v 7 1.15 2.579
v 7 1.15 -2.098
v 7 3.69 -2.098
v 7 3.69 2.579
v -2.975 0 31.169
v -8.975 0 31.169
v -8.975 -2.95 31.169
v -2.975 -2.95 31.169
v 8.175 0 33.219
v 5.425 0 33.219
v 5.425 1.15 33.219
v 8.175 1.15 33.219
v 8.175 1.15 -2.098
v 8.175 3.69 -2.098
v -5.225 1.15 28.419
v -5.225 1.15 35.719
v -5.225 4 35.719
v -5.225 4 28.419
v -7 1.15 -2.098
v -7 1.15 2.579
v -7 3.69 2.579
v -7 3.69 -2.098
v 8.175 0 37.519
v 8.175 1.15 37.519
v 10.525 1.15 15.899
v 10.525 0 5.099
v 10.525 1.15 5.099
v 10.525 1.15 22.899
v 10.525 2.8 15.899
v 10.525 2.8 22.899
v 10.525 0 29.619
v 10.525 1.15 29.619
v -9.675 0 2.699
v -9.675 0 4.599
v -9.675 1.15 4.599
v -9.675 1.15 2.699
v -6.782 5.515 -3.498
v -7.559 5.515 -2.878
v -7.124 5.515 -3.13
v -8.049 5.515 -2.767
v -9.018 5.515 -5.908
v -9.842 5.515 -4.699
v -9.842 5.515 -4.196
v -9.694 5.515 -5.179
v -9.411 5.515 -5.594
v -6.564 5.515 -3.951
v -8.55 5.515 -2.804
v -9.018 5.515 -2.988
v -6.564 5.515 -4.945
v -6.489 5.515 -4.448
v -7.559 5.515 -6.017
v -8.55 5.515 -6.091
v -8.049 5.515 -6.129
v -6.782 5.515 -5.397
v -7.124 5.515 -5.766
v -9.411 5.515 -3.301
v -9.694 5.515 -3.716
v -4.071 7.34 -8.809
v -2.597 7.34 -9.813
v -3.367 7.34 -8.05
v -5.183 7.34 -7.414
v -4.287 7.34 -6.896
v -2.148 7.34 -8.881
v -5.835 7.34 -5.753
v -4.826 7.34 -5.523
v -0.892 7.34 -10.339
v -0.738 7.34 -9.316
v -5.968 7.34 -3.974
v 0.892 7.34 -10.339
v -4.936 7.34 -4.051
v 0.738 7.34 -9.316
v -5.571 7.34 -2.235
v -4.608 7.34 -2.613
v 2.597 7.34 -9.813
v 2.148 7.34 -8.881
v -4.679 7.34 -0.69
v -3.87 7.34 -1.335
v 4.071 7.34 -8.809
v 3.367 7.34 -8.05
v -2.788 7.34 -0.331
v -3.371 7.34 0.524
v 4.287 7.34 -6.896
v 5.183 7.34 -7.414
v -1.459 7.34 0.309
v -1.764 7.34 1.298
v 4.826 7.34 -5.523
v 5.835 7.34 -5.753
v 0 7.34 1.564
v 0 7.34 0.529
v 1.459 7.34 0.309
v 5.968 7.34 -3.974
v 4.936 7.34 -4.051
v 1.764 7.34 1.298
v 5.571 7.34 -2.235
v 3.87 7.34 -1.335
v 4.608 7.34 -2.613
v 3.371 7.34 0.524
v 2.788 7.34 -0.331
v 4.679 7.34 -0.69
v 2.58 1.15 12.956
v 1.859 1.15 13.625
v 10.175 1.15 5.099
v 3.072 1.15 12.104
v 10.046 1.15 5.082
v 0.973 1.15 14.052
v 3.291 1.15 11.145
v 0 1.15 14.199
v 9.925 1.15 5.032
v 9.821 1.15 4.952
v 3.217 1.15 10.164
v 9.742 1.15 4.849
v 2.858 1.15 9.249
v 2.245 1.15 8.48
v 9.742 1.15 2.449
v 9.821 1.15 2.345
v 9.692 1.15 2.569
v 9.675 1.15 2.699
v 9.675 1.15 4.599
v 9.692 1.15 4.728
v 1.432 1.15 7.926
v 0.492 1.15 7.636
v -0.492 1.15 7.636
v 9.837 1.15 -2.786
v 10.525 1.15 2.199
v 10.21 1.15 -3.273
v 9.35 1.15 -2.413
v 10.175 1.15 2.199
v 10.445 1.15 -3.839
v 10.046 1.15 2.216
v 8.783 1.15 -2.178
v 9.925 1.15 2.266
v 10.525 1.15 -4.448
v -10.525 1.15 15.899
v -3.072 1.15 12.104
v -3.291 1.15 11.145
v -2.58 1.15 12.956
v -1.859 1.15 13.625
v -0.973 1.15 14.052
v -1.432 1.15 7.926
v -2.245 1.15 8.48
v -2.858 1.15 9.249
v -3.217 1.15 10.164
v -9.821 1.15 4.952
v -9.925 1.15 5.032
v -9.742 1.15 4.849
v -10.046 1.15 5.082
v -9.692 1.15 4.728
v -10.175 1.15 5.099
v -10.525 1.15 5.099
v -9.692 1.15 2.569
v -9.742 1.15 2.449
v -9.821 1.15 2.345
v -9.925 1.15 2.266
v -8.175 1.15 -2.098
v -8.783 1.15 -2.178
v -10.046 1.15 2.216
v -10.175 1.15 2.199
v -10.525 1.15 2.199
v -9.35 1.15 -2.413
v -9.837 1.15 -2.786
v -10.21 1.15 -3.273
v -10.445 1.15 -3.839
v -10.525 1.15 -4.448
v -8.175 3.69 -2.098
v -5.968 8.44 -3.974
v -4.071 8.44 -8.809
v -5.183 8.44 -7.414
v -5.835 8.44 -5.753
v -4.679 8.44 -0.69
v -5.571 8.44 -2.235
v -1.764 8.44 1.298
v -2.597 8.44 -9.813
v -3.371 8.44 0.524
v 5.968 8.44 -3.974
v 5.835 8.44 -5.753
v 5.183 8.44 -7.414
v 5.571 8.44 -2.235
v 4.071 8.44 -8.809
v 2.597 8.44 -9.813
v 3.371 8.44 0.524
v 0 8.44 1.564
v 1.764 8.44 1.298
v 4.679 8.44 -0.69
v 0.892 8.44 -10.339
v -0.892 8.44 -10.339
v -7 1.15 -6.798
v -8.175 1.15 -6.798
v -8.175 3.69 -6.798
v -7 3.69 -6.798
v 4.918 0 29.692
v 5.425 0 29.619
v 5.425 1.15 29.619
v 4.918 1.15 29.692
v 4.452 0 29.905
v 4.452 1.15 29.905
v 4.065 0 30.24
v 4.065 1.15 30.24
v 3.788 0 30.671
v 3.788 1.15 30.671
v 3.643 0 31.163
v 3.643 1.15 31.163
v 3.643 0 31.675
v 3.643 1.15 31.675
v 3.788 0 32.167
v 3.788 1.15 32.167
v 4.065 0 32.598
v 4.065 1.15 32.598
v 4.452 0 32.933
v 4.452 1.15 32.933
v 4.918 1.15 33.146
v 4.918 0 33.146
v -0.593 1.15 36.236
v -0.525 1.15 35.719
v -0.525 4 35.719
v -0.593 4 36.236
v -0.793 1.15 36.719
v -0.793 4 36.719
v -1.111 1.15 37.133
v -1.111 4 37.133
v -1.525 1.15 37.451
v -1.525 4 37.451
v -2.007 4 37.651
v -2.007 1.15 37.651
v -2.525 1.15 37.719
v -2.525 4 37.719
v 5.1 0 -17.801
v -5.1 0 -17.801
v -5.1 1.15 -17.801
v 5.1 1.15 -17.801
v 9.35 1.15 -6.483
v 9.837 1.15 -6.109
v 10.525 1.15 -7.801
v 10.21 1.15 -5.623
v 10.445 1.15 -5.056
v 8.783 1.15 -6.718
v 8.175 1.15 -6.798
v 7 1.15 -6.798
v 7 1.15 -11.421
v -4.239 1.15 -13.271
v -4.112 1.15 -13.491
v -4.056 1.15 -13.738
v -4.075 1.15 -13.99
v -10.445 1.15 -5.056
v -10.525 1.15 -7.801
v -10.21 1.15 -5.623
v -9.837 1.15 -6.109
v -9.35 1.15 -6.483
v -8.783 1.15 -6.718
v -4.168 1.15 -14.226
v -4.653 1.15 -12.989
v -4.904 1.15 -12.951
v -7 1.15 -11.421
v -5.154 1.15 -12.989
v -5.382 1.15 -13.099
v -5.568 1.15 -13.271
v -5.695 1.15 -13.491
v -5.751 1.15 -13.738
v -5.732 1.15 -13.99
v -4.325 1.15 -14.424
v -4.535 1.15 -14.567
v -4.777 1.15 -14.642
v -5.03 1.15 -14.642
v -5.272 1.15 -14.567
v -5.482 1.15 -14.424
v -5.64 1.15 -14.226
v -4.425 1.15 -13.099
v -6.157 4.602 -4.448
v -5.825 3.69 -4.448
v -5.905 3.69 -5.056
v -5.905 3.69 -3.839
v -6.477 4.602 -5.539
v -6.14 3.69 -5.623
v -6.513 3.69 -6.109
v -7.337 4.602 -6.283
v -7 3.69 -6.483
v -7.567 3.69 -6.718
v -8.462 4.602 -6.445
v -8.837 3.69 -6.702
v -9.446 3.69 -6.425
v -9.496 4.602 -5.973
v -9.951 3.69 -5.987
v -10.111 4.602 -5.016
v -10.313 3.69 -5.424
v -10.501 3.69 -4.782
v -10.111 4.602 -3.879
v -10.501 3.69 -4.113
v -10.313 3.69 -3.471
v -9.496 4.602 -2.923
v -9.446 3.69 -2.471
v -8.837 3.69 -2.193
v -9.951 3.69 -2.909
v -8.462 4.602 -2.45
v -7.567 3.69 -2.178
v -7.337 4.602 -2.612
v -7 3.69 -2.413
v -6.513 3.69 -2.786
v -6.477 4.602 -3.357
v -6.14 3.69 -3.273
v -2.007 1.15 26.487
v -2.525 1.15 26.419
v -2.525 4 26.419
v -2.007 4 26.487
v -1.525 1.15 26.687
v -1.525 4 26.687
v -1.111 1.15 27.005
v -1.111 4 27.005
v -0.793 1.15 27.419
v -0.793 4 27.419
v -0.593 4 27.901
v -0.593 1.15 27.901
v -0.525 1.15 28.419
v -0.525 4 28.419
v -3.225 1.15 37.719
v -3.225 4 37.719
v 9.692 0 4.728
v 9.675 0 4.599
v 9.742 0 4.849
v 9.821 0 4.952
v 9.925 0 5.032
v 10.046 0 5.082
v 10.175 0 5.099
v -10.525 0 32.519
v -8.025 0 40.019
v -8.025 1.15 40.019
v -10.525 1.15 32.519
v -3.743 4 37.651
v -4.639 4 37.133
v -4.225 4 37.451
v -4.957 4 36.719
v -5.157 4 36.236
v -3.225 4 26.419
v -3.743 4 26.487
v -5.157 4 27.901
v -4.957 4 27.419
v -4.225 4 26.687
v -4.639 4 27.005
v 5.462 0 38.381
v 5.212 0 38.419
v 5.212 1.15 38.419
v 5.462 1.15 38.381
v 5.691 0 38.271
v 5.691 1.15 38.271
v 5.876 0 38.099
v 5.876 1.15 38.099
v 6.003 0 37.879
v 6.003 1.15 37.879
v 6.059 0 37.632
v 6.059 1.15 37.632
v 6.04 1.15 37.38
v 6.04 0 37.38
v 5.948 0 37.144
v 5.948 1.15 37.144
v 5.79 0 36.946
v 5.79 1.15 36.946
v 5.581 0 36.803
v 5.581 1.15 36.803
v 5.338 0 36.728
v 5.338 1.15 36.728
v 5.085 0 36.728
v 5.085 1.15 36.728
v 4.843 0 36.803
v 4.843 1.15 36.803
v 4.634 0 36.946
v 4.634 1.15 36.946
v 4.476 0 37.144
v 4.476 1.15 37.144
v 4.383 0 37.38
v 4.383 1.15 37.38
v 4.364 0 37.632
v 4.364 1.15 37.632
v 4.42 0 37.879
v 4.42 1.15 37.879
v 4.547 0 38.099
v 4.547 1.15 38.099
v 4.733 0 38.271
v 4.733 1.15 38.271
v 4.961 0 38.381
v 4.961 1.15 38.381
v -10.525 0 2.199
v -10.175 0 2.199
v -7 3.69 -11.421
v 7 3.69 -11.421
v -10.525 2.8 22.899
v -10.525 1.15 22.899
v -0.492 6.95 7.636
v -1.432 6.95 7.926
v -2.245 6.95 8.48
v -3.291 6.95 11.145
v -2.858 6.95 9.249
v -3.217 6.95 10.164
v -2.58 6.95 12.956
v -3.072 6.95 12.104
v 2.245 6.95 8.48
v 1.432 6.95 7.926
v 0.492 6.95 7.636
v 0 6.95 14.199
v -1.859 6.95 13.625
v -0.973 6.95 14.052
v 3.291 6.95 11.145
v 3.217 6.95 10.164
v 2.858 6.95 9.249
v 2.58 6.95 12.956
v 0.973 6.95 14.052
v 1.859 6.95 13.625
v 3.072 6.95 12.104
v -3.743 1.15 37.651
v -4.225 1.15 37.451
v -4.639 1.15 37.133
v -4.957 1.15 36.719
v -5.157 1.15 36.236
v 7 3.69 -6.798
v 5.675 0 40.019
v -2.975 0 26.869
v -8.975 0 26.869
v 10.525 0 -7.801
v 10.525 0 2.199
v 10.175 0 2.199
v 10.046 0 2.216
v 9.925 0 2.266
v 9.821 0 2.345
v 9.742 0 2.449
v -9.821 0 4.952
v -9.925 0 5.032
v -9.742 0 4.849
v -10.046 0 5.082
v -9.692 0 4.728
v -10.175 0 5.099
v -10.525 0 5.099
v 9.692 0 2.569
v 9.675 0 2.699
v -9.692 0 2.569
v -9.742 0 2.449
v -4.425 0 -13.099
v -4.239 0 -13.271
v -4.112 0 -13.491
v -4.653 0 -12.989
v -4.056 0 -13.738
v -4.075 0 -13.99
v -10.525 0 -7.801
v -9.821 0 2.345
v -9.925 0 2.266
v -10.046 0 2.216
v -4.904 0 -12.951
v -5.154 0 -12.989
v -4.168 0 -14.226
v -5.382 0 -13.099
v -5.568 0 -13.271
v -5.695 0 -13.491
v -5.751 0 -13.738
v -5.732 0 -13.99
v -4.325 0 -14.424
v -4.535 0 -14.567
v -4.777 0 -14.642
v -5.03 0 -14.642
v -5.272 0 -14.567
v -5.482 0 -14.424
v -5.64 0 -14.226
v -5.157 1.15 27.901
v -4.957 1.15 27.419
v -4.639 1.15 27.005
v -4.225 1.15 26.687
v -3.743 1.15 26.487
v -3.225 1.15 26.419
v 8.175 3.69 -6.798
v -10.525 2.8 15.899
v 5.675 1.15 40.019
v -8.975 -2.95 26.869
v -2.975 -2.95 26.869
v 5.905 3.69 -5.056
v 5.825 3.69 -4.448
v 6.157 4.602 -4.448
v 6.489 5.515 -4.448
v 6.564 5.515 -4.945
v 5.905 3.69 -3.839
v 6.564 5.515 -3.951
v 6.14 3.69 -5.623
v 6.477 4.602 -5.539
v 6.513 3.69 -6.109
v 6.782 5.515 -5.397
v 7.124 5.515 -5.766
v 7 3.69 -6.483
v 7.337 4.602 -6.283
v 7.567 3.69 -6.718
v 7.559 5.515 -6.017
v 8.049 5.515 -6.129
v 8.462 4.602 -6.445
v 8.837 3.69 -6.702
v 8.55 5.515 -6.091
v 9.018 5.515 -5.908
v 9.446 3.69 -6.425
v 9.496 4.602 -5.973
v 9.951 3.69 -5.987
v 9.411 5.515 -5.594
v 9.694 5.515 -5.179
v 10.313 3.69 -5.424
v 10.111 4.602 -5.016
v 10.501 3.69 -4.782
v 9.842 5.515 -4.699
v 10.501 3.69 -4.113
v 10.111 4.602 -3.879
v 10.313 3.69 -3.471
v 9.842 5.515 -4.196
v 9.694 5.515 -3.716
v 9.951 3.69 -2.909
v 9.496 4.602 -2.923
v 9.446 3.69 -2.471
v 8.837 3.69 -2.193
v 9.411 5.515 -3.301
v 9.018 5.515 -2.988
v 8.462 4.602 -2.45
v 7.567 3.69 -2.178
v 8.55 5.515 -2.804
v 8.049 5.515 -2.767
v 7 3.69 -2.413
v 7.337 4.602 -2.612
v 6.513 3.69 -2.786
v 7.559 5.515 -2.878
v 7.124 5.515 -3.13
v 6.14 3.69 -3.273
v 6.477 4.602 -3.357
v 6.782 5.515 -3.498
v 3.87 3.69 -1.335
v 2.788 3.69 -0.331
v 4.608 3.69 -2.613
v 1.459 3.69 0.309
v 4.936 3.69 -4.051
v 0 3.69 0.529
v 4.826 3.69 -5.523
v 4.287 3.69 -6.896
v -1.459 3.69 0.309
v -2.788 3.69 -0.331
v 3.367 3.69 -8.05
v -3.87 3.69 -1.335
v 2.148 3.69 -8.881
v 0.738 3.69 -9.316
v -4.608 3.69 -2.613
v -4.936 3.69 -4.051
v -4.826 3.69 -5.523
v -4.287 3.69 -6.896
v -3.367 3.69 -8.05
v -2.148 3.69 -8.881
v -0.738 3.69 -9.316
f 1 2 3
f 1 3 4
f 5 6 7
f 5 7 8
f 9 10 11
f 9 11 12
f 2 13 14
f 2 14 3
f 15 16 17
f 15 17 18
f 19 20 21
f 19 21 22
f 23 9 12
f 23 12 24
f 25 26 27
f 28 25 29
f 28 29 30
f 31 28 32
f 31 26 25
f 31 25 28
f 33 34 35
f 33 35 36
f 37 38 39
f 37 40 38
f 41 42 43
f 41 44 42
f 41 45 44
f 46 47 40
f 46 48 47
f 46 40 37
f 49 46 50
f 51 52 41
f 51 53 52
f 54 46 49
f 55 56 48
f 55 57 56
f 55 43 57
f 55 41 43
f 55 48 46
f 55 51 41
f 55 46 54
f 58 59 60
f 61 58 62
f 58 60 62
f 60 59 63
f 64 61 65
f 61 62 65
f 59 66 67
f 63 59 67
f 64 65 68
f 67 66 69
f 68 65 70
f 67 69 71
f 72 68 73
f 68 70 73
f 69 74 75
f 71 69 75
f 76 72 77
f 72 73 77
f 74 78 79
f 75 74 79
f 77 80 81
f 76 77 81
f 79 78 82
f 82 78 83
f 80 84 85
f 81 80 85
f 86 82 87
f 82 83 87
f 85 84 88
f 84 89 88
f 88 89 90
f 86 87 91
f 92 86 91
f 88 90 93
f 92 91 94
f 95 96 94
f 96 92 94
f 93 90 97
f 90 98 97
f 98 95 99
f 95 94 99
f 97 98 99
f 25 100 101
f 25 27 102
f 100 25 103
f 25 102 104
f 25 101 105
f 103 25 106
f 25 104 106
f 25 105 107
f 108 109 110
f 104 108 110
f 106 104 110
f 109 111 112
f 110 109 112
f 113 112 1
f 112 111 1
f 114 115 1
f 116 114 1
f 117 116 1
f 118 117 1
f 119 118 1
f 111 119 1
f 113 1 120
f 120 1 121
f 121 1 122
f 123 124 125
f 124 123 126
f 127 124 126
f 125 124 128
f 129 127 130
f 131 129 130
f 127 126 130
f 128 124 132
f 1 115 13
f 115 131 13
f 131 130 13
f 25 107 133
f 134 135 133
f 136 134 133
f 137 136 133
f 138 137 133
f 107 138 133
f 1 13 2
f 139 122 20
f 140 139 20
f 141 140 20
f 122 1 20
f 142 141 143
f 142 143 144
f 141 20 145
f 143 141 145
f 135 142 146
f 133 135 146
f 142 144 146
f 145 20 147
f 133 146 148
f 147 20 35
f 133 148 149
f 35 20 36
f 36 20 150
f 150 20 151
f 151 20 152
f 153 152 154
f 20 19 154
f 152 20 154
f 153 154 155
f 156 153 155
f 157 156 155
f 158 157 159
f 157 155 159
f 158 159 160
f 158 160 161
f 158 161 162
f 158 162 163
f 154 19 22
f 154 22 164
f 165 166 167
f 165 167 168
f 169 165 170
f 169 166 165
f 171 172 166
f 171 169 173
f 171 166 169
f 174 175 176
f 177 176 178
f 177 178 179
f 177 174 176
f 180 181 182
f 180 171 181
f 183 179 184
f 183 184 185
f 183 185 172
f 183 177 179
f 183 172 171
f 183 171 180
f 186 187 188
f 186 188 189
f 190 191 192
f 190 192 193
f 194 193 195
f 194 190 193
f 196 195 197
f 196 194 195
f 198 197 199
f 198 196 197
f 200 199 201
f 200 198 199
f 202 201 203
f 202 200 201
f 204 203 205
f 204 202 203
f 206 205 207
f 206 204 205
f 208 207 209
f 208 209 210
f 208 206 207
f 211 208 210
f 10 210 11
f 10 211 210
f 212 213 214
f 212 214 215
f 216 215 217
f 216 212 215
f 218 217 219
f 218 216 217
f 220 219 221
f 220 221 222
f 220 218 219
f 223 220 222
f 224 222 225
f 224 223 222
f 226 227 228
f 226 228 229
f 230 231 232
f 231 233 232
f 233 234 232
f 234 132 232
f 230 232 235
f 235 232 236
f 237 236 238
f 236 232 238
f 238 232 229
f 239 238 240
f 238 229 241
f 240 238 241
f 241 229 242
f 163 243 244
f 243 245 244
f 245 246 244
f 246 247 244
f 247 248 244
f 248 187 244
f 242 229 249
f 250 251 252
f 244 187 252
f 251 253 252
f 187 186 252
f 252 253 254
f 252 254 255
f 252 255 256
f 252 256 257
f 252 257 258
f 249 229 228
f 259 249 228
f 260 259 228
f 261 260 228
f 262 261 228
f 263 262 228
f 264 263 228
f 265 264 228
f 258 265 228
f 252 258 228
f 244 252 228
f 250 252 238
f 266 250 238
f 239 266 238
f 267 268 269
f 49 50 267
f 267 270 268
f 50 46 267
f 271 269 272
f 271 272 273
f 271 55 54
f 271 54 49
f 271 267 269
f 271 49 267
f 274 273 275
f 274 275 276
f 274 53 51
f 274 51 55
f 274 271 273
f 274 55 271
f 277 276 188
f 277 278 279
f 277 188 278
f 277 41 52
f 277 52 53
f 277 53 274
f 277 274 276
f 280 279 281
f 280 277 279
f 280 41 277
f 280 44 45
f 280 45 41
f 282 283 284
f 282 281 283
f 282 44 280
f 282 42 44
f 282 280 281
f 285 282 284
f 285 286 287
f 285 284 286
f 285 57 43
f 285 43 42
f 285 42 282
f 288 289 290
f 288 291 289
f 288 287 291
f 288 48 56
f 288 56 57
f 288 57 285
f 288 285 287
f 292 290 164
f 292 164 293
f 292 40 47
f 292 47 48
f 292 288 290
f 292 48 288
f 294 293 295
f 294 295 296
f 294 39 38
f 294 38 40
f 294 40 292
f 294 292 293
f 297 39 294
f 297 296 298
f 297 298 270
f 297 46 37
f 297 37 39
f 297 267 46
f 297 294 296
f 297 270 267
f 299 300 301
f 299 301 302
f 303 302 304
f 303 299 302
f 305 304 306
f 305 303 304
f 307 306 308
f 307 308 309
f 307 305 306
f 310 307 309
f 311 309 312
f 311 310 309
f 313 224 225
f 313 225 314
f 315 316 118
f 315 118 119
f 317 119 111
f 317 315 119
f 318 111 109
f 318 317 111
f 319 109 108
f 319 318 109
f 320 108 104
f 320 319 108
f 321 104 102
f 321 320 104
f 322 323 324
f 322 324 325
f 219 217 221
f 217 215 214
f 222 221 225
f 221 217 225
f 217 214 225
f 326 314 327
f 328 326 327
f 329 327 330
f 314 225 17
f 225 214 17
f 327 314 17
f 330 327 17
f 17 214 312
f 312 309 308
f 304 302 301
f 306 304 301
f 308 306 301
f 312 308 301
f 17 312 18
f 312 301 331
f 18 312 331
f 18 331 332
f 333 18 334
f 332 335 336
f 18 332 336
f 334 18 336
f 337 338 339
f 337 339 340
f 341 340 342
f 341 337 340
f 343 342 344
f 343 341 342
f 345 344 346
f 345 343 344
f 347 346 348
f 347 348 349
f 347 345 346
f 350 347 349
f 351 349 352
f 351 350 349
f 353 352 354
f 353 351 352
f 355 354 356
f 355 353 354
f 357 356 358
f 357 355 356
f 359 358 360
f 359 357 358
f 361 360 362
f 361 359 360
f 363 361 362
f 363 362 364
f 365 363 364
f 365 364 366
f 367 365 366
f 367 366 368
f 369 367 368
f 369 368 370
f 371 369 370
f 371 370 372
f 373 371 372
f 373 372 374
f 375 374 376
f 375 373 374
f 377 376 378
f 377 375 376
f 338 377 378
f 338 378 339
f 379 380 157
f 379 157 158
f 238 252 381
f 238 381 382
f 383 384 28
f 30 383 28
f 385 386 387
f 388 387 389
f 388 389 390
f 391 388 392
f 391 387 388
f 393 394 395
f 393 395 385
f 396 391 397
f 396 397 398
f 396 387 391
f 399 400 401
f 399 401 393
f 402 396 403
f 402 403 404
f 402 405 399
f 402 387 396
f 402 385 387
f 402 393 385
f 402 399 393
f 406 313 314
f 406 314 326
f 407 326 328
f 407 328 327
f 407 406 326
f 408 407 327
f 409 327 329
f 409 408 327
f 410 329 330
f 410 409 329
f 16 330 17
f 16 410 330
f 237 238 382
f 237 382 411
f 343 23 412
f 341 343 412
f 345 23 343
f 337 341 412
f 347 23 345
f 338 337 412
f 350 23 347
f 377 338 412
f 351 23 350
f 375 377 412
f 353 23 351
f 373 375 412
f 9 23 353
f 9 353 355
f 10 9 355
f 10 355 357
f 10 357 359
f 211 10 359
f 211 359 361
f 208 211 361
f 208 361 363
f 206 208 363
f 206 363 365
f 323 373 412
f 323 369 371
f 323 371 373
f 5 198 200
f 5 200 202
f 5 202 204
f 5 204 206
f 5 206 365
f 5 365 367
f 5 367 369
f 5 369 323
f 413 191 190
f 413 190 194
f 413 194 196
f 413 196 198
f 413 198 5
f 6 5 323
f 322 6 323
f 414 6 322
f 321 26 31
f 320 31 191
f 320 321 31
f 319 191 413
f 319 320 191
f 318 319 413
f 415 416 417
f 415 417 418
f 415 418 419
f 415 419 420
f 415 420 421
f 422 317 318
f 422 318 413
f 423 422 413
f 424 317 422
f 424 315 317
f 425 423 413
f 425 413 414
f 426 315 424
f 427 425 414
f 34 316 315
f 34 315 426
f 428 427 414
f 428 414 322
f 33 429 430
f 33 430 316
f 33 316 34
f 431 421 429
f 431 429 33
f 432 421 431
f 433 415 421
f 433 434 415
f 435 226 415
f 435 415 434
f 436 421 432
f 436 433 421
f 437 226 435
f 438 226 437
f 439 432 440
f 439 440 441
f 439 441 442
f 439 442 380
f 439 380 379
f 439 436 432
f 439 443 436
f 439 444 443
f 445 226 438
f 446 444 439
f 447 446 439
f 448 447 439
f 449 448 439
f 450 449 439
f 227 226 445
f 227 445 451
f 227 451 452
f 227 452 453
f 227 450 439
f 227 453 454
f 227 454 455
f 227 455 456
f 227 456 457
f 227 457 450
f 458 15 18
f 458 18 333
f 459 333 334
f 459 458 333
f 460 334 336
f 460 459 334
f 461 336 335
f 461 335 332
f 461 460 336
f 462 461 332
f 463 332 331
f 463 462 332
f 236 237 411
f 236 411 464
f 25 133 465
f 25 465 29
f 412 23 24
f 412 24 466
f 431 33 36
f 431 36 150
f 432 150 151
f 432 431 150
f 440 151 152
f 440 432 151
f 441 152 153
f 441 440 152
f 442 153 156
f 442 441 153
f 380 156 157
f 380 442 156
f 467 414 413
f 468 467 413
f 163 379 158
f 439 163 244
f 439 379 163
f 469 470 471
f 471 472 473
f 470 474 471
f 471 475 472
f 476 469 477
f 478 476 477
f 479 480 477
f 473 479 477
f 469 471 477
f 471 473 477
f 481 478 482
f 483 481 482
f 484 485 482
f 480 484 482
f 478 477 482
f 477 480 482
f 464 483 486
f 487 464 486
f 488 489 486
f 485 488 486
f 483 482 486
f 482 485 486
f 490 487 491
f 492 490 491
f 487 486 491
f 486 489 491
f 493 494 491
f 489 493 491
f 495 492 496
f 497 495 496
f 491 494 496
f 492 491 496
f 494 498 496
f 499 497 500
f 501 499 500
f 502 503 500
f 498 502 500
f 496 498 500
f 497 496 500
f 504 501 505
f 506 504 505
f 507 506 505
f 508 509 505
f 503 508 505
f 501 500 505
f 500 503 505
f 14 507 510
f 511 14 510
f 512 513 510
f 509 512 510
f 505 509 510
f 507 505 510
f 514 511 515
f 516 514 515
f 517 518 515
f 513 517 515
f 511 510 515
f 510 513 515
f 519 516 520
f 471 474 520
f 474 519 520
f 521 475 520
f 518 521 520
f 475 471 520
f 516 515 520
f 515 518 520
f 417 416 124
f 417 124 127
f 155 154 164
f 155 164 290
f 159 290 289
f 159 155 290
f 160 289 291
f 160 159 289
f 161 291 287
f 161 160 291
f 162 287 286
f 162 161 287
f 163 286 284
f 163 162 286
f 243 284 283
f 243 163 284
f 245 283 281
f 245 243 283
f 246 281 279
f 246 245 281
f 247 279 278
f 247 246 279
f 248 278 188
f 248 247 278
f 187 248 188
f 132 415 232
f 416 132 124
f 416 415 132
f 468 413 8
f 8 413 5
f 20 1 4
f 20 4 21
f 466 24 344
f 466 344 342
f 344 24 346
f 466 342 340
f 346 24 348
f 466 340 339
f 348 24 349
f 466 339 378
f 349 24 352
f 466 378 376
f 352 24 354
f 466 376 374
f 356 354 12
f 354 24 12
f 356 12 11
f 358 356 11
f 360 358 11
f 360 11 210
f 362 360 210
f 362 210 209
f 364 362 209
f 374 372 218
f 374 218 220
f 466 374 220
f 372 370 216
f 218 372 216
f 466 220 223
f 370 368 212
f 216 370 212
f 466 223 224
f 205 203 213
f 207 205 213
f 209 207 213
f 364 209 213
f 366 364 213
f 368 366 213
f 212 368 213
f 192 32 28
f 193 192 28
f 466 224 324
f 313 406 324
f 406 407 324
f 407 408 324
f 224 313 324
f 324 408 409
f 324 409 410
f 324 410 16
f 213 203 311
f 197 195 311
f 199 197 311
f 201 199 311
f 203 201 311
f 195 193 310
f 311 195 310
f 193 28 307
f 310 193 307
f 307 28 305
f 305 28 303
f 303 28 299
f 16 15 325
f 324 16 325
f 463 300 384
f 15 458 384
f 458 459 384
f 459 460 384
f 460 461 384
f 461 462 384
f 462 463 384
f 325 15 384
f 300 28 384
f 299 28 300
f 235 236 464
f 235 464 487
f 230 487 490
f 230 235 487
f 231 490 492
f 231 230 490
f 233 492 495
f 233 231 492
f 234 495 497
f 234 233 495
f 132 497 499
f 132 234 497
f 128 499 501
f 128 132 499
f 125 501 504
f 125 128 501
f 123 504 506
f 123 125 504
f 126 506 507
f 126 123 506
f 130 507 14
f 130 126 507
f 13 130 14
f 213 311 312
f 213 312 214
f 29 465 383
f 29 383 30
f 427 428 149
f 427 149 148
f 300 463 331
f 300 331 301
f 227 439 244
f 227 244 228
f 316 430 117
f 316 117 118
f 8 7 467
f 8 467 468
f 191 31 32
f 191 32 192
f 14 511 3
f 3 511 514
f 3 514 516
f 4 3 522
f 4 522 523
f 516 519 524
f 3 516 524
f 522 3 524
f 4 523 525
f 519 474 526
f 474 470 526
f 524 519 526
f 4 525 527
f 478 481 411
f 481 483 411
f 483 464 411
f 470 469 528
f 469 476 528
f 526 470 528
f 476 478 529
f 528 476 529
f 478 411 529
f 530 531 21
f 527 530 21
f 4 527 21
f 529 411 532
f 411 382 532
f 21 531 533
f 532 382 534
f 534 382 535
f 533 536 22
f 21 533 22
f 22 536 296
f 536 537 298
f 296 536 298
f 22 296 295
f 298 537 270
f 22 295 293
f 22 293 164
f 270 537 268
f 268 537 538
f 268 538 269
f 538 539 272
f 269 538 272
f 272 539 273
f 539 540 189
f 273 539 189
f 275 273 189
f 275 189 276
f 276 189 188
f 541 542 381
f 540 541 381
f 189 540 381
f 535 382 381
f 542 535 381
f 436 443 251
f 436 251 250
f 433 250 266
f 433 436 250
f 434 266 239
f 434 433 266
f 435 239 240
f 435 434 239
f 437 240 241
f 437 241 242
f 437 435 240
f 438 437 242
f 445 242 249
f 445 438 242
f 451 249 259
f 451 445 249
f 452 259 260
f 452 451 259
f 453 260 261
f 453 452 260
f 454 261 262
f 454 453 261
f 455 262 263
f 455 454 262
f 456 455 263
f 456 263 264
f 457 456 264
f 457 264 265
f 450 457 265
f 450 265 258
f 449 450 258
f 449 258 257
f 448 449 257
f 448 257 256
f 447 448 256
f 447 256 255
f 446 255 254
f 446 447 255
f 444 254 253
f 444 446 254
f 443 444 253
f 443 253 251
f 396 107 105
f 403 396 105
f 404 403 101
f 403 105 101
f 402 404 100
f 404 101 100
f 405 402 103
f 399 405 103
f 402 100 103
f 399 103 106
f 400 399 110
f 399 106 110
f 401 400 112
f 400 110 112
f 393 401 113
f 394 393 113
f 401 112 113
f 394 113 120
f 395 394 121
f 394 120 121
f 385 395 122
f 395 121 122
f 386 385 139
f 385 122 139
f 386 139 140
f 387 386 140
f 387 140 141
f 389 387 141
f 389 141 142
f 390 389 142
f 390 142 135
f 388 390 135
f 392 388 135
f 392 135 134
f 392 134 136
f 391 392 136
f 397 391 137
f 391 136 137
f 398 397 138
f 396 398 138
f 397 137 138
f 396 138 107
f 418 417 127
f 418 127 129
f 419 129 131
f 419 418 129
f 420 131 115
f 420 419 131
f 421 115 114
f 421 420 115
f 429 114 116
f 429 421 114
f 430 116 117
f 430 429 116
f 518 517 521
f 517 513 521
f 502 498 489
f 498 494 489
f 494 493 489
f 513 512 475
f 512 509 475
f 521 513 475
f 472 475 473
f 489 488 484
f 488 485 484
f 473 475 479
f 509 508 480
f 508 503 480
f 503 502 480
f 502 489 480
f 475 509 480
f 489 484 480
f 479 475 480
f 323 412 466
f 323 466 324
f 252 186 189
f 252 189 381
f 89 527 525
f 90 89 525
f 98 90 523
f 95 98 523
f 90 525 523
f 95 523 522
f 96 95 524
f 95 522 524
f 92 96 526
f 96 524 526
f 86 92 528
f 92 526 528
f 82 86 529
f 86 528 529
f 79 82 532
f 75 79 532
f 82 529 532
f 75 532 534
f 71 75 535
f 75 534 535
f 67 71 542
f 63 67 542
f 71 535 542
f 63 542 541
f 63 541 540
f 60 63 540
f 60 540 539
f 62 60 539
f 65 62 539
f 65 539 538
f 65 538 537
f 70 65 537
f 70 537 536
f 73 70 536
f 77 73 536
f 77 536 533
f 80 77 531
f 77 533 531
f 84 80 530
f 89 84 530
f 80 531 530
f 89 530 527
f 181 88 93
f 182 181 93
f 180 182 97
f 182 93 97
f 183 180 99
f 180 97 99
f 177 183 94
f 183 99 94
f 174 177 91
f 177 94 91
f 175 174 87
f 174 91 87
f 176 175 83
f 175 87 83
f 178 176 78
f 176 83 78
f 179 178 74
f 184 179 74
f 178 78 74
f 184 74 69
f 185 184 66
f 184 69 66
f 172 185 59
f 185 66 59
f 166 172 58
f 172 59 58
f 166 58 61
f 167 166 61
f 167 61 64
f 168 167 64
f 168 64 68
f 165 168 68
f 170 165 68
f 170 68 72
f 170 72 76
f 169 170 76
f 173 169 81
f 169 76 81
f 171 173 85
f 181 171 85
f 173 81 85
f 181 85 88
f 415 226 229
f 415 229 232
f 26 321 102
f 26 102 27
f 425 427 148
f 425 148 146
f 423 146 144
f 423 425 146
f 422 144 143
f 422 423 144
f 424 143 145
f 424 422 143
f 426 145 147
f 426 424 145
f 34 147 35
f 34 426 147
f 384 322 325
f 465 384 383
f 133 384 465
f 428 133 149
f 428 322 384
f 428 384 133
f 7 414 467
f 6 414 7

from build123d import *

# Parameters (mm, degrees)
SKETCH_1_R      = 0.85
EXTRUDE_1_DEPTH = 1.15
EXTRUDE_2_DEPTH = 2.54
SKETCH_3_R      = 4.95
EXTRUDE_3_DEPTH = 3.65
SKETCH_4_R      = 5.985
EXTRUDE_4_DEPTH = 1.1
SKETCH_5_R      = 2.35
EXTRUDE_5_DEPTH = 1.825
EXTRUDE_5_TAPER = 20
SKETCH_6_R      = 3.3
EXTRUDE_6_DEPTH = 5.8
SKETCH_7_W      = 21.05
SKETCH_7_H      = 7
EXTRUDE_7_DEPTH = 1.65
EXTRUDE_8_DEPTH = 2.85
SKETCH_9_W      = 6
SKETCH_9_H      = 4.3
EXTRUDE_9_DEPTH = 2.95


with BuildPart() as part:
    # Эскиз1 → Бобышка-Вытянуть1 (new body)
    with BuildSketch(Plane(origin=(0, 0, 0), x_dir=(1, 0, 0), z_dir=(0, 1, 0))):
        with BuildLine():
            Line((5.1, 17.801195131), (10.525, 7.801195131))
            Line((10.525, 7.801195131), (10.525, -2.198804869))
            Line((10.525, -2.198804869), (10.175, -2.198804869))
            ThreePointArc((10.175, -2.198804869), (9.821446609, -2.345251479), (9.675, -2.698804869))
            Line((9.675, -2.698804869), (9.675, -4.598804869))
            ThreePointArc((9.675, -4.598804869), (9.821446609, -4.95235826), (10.175, -5.098804869))
            Line((10.175, -5.098804869), (10.525, -5.098804869))
            Line((10.525, -5.098804869), (10.525, -29.618804869))
            Line((10.525, -29.618804869), (5.425, -29.618804869))
            ThreePointArc((5.425, -29.618804869), (3.625, -31.418804869), (5.425, -33.218804869))
            Line((5.425, -33.218804869), (8.175, -33.218804869))
            Line((8.175, -33.218804869), (8.175, -37.518804869))
            Line((8.175, -37.518804869), (5.675, -40.018804869))
            Line((5.675, -40.018804869), (-8.025, -40.018804869))
            Line((-8.025, -40.018804869), (-10.525, -32.518804869))
            Line((-10.525, -32.518804869), (-10.525, -5.098804869))
            Line((-10.525, -5.098804869), (-10.175, -5.098804869))
            ThreePointArc((-10.175, -5.098804869), (-9.821446609, -4.95235826), (-9.675, -4.598804869))
            Line((-9.675, -4.598804869), (-9.675, -2.698804869))
            ThreePointArc((-9.675, -2.698804869), (-9.821446609, -2.345251479), (-10.175, -2.198804869))
            Line((-10.175, -2.198804869), (-10.525, -2.198804869))
            Line((-10.525, -2.198804869), (-10.525, 7.801195131))
            Line((-10.525, 7.801195131), (-5.1, 17.801195131))
            Line((-5.1, 17.801195131), (5.1, 17.801195131))
        make_face()
        with Locations(Location((5.211720062, -37.568804869, 0), (0, 0, 270))):
            Circle(SKETCH_1_R, mode=Mode.SUBTRACT)
        with Locations(Location((-4.903634314, 13.801195131, 0), (0, 0, 270))):
            Circle(SKETCH_1_R, mode=Mode.SUBTRACT)
    extrude(amount=EXTRUDE_1_DEPTH)

    # Эскиз2 → Бобышка-Вытянуть2 (add)
    with BuildSketch(Plane(origin=(0, 1.15, 0), x_dir=(1, 0, 0), z_dir=(0, 1, 0))):
        with BuildLine():
            Line((-7, 11.421195131), (7, 11.421195131))
            Line((7, 11.421195131), (7, 6.797688136))
            Line((7, 6.797688136), (8.175, 6.797688136))
            ThreePointArc((8.175, 6.797688136), (10.525, 4.447688136), (8.175, 2.097688136))
            Line((8.175, 2.097688136), (7, 2.097688136))
            Line((7, 2.097688136), (7, -2.578804869))
            Line((7, -2.578804869), (-7, -2.578804869))
            Line((-7, -2.578804869), (-7, 2.097688136))
            Line((-7, 2.097688136), (-8.175, 2.097688136))
            ThreePointArc((-8.175, 2.097688136), (-10.525, 4.447688136), (-8.175, 6.797688136))
            Line((-8.175, 6.797688136), (-7, 6.797688136))
            Line((-7, 6.797688136), (-7, 11.421195131))
        make_face()
    extrude(amount=EXTRUDE_2_DEPTH)

    # Эскиз3 → Бобышка-Вытянуть3 (add)
    with BuildSketch(Plane(origin=(0, 3.69, 0), x_dir=(1, 0, 0), z_dir=(0, 1, 0))):
        with Locations(Location((0, 4.421195131, 0), (0, 0, 270))):
            Circle(SKETCH_3_R)
    extrude(amount=EXTRUDE_3_DEPTH)

    # Эскиз4 → Бобышка-Вытянуть4 (add)
    with BuildSketch(Plane(origin=(0, 7.34, 0), x_dir=(1, 0, 0), z_dir=(0, 1, 0))):
        with Locations(Location((0, 4.421195131, 0), (0, 0, 270))):
            Circle(SKETCH_4_R)
    extrude(amount=EXTRUDE_4_DEPTH)

    # Эскиз5 → Бобышка-Вытянуть5 (add)
    with BuildSketch(Plane(origin=(0, 3.69, 0), x_dir=(1, 0, 0), z_dir=(0, 1, 0))):
        with Locations((-8.175, 4.447688136)):
            Circle(SKETCH_5_R)
    extrude_5 = extrude(amount=EXTRUDE_5_DEPTH, taper=EXTRUDE_5_TAPER)

    # Зеркальное отражение1: Бобышка-Вытянуть5 across plane
    add(extrude_5.mirror(Plane(origin=(0, 0, 0), x_dir=(0, 0, 1), z_dir=(1, 0, 0))))

    # Эскиз6 → Бобышка-Вытянуть6 (add)
    with BuildSketch(Plane(origin=(0, 1.15, 0), x_dir=(1, 0, 0), z_dir=(0, 1, 0))):
        with Locations(Location((0, -10.898804869, 0), (0, 0, 270))):
            Circle(SKETCH_6_R)
    extrude(amount=EXTRUDE_6_DEPTH)

    # Эскиз7 → Бобышка-Вытянуть7 (add)
    with BuildSketch(Plane(origin=(0, 1.15, 0), x_dir=(1, 0, 0), z_dir=(0, 1, 0))):
        with Locations((0, -19.398804869)):
            Rectangle(SKETCH_7_W, SKETCH_7_H)
    extrude(amount=EXTRUDE_7_DEPTH)

    # Эскиз8 → Бобышка-Вытянуть8 (add)
    with BuildSketch(Plane(origin=(0, 1.15, 0), x_dir=(1, 0, 0), z_dir=(0, 1, 0))):
        with BuildLine():
            Line((-3.225, -26.418804869), (-2.525, -26.418804869))
            ThreePointArc((-2.525, -26.418804869), (-1.110786438, -27.004591307), (-0.525, -28.418804869))
            Line((-0.525, -28.418804869), (-0.525, -35.718804869))
            ThreePointArc((-0.525, -35.718804869), (-1.110786438, -37.133018432), (-2.525, -37.718804869))
            Line((-2.525, -37.718804869), (-3.225, -37.718804869))
            ThreePointArc((-3.225, -37.718804869), (-4.639213562, -37.133018432), (-5.225, -35.718804869))
            Line((-5.225, -35.718804869), (-5.225, -28.418804869))
            ThreePointArc((-5.225, -28.418804869), (-4.639213562, -27.004591307), (-3.225, -26.418804869))
        make_face()
    extrude(amount=EXTRUDE_8_DEPTH)

    # Эскиз9 → Бобышка-Вытянуть9 (add)
    with BuildSketch(Plane.XZ):
        with Locations((-5.975, 29.018804869)):
            Rectangle(SKETCH_9_W, SKETCH_9_H)
    extrude(amount=EXTRUDE_9_DEPTH)


solid = part.part
